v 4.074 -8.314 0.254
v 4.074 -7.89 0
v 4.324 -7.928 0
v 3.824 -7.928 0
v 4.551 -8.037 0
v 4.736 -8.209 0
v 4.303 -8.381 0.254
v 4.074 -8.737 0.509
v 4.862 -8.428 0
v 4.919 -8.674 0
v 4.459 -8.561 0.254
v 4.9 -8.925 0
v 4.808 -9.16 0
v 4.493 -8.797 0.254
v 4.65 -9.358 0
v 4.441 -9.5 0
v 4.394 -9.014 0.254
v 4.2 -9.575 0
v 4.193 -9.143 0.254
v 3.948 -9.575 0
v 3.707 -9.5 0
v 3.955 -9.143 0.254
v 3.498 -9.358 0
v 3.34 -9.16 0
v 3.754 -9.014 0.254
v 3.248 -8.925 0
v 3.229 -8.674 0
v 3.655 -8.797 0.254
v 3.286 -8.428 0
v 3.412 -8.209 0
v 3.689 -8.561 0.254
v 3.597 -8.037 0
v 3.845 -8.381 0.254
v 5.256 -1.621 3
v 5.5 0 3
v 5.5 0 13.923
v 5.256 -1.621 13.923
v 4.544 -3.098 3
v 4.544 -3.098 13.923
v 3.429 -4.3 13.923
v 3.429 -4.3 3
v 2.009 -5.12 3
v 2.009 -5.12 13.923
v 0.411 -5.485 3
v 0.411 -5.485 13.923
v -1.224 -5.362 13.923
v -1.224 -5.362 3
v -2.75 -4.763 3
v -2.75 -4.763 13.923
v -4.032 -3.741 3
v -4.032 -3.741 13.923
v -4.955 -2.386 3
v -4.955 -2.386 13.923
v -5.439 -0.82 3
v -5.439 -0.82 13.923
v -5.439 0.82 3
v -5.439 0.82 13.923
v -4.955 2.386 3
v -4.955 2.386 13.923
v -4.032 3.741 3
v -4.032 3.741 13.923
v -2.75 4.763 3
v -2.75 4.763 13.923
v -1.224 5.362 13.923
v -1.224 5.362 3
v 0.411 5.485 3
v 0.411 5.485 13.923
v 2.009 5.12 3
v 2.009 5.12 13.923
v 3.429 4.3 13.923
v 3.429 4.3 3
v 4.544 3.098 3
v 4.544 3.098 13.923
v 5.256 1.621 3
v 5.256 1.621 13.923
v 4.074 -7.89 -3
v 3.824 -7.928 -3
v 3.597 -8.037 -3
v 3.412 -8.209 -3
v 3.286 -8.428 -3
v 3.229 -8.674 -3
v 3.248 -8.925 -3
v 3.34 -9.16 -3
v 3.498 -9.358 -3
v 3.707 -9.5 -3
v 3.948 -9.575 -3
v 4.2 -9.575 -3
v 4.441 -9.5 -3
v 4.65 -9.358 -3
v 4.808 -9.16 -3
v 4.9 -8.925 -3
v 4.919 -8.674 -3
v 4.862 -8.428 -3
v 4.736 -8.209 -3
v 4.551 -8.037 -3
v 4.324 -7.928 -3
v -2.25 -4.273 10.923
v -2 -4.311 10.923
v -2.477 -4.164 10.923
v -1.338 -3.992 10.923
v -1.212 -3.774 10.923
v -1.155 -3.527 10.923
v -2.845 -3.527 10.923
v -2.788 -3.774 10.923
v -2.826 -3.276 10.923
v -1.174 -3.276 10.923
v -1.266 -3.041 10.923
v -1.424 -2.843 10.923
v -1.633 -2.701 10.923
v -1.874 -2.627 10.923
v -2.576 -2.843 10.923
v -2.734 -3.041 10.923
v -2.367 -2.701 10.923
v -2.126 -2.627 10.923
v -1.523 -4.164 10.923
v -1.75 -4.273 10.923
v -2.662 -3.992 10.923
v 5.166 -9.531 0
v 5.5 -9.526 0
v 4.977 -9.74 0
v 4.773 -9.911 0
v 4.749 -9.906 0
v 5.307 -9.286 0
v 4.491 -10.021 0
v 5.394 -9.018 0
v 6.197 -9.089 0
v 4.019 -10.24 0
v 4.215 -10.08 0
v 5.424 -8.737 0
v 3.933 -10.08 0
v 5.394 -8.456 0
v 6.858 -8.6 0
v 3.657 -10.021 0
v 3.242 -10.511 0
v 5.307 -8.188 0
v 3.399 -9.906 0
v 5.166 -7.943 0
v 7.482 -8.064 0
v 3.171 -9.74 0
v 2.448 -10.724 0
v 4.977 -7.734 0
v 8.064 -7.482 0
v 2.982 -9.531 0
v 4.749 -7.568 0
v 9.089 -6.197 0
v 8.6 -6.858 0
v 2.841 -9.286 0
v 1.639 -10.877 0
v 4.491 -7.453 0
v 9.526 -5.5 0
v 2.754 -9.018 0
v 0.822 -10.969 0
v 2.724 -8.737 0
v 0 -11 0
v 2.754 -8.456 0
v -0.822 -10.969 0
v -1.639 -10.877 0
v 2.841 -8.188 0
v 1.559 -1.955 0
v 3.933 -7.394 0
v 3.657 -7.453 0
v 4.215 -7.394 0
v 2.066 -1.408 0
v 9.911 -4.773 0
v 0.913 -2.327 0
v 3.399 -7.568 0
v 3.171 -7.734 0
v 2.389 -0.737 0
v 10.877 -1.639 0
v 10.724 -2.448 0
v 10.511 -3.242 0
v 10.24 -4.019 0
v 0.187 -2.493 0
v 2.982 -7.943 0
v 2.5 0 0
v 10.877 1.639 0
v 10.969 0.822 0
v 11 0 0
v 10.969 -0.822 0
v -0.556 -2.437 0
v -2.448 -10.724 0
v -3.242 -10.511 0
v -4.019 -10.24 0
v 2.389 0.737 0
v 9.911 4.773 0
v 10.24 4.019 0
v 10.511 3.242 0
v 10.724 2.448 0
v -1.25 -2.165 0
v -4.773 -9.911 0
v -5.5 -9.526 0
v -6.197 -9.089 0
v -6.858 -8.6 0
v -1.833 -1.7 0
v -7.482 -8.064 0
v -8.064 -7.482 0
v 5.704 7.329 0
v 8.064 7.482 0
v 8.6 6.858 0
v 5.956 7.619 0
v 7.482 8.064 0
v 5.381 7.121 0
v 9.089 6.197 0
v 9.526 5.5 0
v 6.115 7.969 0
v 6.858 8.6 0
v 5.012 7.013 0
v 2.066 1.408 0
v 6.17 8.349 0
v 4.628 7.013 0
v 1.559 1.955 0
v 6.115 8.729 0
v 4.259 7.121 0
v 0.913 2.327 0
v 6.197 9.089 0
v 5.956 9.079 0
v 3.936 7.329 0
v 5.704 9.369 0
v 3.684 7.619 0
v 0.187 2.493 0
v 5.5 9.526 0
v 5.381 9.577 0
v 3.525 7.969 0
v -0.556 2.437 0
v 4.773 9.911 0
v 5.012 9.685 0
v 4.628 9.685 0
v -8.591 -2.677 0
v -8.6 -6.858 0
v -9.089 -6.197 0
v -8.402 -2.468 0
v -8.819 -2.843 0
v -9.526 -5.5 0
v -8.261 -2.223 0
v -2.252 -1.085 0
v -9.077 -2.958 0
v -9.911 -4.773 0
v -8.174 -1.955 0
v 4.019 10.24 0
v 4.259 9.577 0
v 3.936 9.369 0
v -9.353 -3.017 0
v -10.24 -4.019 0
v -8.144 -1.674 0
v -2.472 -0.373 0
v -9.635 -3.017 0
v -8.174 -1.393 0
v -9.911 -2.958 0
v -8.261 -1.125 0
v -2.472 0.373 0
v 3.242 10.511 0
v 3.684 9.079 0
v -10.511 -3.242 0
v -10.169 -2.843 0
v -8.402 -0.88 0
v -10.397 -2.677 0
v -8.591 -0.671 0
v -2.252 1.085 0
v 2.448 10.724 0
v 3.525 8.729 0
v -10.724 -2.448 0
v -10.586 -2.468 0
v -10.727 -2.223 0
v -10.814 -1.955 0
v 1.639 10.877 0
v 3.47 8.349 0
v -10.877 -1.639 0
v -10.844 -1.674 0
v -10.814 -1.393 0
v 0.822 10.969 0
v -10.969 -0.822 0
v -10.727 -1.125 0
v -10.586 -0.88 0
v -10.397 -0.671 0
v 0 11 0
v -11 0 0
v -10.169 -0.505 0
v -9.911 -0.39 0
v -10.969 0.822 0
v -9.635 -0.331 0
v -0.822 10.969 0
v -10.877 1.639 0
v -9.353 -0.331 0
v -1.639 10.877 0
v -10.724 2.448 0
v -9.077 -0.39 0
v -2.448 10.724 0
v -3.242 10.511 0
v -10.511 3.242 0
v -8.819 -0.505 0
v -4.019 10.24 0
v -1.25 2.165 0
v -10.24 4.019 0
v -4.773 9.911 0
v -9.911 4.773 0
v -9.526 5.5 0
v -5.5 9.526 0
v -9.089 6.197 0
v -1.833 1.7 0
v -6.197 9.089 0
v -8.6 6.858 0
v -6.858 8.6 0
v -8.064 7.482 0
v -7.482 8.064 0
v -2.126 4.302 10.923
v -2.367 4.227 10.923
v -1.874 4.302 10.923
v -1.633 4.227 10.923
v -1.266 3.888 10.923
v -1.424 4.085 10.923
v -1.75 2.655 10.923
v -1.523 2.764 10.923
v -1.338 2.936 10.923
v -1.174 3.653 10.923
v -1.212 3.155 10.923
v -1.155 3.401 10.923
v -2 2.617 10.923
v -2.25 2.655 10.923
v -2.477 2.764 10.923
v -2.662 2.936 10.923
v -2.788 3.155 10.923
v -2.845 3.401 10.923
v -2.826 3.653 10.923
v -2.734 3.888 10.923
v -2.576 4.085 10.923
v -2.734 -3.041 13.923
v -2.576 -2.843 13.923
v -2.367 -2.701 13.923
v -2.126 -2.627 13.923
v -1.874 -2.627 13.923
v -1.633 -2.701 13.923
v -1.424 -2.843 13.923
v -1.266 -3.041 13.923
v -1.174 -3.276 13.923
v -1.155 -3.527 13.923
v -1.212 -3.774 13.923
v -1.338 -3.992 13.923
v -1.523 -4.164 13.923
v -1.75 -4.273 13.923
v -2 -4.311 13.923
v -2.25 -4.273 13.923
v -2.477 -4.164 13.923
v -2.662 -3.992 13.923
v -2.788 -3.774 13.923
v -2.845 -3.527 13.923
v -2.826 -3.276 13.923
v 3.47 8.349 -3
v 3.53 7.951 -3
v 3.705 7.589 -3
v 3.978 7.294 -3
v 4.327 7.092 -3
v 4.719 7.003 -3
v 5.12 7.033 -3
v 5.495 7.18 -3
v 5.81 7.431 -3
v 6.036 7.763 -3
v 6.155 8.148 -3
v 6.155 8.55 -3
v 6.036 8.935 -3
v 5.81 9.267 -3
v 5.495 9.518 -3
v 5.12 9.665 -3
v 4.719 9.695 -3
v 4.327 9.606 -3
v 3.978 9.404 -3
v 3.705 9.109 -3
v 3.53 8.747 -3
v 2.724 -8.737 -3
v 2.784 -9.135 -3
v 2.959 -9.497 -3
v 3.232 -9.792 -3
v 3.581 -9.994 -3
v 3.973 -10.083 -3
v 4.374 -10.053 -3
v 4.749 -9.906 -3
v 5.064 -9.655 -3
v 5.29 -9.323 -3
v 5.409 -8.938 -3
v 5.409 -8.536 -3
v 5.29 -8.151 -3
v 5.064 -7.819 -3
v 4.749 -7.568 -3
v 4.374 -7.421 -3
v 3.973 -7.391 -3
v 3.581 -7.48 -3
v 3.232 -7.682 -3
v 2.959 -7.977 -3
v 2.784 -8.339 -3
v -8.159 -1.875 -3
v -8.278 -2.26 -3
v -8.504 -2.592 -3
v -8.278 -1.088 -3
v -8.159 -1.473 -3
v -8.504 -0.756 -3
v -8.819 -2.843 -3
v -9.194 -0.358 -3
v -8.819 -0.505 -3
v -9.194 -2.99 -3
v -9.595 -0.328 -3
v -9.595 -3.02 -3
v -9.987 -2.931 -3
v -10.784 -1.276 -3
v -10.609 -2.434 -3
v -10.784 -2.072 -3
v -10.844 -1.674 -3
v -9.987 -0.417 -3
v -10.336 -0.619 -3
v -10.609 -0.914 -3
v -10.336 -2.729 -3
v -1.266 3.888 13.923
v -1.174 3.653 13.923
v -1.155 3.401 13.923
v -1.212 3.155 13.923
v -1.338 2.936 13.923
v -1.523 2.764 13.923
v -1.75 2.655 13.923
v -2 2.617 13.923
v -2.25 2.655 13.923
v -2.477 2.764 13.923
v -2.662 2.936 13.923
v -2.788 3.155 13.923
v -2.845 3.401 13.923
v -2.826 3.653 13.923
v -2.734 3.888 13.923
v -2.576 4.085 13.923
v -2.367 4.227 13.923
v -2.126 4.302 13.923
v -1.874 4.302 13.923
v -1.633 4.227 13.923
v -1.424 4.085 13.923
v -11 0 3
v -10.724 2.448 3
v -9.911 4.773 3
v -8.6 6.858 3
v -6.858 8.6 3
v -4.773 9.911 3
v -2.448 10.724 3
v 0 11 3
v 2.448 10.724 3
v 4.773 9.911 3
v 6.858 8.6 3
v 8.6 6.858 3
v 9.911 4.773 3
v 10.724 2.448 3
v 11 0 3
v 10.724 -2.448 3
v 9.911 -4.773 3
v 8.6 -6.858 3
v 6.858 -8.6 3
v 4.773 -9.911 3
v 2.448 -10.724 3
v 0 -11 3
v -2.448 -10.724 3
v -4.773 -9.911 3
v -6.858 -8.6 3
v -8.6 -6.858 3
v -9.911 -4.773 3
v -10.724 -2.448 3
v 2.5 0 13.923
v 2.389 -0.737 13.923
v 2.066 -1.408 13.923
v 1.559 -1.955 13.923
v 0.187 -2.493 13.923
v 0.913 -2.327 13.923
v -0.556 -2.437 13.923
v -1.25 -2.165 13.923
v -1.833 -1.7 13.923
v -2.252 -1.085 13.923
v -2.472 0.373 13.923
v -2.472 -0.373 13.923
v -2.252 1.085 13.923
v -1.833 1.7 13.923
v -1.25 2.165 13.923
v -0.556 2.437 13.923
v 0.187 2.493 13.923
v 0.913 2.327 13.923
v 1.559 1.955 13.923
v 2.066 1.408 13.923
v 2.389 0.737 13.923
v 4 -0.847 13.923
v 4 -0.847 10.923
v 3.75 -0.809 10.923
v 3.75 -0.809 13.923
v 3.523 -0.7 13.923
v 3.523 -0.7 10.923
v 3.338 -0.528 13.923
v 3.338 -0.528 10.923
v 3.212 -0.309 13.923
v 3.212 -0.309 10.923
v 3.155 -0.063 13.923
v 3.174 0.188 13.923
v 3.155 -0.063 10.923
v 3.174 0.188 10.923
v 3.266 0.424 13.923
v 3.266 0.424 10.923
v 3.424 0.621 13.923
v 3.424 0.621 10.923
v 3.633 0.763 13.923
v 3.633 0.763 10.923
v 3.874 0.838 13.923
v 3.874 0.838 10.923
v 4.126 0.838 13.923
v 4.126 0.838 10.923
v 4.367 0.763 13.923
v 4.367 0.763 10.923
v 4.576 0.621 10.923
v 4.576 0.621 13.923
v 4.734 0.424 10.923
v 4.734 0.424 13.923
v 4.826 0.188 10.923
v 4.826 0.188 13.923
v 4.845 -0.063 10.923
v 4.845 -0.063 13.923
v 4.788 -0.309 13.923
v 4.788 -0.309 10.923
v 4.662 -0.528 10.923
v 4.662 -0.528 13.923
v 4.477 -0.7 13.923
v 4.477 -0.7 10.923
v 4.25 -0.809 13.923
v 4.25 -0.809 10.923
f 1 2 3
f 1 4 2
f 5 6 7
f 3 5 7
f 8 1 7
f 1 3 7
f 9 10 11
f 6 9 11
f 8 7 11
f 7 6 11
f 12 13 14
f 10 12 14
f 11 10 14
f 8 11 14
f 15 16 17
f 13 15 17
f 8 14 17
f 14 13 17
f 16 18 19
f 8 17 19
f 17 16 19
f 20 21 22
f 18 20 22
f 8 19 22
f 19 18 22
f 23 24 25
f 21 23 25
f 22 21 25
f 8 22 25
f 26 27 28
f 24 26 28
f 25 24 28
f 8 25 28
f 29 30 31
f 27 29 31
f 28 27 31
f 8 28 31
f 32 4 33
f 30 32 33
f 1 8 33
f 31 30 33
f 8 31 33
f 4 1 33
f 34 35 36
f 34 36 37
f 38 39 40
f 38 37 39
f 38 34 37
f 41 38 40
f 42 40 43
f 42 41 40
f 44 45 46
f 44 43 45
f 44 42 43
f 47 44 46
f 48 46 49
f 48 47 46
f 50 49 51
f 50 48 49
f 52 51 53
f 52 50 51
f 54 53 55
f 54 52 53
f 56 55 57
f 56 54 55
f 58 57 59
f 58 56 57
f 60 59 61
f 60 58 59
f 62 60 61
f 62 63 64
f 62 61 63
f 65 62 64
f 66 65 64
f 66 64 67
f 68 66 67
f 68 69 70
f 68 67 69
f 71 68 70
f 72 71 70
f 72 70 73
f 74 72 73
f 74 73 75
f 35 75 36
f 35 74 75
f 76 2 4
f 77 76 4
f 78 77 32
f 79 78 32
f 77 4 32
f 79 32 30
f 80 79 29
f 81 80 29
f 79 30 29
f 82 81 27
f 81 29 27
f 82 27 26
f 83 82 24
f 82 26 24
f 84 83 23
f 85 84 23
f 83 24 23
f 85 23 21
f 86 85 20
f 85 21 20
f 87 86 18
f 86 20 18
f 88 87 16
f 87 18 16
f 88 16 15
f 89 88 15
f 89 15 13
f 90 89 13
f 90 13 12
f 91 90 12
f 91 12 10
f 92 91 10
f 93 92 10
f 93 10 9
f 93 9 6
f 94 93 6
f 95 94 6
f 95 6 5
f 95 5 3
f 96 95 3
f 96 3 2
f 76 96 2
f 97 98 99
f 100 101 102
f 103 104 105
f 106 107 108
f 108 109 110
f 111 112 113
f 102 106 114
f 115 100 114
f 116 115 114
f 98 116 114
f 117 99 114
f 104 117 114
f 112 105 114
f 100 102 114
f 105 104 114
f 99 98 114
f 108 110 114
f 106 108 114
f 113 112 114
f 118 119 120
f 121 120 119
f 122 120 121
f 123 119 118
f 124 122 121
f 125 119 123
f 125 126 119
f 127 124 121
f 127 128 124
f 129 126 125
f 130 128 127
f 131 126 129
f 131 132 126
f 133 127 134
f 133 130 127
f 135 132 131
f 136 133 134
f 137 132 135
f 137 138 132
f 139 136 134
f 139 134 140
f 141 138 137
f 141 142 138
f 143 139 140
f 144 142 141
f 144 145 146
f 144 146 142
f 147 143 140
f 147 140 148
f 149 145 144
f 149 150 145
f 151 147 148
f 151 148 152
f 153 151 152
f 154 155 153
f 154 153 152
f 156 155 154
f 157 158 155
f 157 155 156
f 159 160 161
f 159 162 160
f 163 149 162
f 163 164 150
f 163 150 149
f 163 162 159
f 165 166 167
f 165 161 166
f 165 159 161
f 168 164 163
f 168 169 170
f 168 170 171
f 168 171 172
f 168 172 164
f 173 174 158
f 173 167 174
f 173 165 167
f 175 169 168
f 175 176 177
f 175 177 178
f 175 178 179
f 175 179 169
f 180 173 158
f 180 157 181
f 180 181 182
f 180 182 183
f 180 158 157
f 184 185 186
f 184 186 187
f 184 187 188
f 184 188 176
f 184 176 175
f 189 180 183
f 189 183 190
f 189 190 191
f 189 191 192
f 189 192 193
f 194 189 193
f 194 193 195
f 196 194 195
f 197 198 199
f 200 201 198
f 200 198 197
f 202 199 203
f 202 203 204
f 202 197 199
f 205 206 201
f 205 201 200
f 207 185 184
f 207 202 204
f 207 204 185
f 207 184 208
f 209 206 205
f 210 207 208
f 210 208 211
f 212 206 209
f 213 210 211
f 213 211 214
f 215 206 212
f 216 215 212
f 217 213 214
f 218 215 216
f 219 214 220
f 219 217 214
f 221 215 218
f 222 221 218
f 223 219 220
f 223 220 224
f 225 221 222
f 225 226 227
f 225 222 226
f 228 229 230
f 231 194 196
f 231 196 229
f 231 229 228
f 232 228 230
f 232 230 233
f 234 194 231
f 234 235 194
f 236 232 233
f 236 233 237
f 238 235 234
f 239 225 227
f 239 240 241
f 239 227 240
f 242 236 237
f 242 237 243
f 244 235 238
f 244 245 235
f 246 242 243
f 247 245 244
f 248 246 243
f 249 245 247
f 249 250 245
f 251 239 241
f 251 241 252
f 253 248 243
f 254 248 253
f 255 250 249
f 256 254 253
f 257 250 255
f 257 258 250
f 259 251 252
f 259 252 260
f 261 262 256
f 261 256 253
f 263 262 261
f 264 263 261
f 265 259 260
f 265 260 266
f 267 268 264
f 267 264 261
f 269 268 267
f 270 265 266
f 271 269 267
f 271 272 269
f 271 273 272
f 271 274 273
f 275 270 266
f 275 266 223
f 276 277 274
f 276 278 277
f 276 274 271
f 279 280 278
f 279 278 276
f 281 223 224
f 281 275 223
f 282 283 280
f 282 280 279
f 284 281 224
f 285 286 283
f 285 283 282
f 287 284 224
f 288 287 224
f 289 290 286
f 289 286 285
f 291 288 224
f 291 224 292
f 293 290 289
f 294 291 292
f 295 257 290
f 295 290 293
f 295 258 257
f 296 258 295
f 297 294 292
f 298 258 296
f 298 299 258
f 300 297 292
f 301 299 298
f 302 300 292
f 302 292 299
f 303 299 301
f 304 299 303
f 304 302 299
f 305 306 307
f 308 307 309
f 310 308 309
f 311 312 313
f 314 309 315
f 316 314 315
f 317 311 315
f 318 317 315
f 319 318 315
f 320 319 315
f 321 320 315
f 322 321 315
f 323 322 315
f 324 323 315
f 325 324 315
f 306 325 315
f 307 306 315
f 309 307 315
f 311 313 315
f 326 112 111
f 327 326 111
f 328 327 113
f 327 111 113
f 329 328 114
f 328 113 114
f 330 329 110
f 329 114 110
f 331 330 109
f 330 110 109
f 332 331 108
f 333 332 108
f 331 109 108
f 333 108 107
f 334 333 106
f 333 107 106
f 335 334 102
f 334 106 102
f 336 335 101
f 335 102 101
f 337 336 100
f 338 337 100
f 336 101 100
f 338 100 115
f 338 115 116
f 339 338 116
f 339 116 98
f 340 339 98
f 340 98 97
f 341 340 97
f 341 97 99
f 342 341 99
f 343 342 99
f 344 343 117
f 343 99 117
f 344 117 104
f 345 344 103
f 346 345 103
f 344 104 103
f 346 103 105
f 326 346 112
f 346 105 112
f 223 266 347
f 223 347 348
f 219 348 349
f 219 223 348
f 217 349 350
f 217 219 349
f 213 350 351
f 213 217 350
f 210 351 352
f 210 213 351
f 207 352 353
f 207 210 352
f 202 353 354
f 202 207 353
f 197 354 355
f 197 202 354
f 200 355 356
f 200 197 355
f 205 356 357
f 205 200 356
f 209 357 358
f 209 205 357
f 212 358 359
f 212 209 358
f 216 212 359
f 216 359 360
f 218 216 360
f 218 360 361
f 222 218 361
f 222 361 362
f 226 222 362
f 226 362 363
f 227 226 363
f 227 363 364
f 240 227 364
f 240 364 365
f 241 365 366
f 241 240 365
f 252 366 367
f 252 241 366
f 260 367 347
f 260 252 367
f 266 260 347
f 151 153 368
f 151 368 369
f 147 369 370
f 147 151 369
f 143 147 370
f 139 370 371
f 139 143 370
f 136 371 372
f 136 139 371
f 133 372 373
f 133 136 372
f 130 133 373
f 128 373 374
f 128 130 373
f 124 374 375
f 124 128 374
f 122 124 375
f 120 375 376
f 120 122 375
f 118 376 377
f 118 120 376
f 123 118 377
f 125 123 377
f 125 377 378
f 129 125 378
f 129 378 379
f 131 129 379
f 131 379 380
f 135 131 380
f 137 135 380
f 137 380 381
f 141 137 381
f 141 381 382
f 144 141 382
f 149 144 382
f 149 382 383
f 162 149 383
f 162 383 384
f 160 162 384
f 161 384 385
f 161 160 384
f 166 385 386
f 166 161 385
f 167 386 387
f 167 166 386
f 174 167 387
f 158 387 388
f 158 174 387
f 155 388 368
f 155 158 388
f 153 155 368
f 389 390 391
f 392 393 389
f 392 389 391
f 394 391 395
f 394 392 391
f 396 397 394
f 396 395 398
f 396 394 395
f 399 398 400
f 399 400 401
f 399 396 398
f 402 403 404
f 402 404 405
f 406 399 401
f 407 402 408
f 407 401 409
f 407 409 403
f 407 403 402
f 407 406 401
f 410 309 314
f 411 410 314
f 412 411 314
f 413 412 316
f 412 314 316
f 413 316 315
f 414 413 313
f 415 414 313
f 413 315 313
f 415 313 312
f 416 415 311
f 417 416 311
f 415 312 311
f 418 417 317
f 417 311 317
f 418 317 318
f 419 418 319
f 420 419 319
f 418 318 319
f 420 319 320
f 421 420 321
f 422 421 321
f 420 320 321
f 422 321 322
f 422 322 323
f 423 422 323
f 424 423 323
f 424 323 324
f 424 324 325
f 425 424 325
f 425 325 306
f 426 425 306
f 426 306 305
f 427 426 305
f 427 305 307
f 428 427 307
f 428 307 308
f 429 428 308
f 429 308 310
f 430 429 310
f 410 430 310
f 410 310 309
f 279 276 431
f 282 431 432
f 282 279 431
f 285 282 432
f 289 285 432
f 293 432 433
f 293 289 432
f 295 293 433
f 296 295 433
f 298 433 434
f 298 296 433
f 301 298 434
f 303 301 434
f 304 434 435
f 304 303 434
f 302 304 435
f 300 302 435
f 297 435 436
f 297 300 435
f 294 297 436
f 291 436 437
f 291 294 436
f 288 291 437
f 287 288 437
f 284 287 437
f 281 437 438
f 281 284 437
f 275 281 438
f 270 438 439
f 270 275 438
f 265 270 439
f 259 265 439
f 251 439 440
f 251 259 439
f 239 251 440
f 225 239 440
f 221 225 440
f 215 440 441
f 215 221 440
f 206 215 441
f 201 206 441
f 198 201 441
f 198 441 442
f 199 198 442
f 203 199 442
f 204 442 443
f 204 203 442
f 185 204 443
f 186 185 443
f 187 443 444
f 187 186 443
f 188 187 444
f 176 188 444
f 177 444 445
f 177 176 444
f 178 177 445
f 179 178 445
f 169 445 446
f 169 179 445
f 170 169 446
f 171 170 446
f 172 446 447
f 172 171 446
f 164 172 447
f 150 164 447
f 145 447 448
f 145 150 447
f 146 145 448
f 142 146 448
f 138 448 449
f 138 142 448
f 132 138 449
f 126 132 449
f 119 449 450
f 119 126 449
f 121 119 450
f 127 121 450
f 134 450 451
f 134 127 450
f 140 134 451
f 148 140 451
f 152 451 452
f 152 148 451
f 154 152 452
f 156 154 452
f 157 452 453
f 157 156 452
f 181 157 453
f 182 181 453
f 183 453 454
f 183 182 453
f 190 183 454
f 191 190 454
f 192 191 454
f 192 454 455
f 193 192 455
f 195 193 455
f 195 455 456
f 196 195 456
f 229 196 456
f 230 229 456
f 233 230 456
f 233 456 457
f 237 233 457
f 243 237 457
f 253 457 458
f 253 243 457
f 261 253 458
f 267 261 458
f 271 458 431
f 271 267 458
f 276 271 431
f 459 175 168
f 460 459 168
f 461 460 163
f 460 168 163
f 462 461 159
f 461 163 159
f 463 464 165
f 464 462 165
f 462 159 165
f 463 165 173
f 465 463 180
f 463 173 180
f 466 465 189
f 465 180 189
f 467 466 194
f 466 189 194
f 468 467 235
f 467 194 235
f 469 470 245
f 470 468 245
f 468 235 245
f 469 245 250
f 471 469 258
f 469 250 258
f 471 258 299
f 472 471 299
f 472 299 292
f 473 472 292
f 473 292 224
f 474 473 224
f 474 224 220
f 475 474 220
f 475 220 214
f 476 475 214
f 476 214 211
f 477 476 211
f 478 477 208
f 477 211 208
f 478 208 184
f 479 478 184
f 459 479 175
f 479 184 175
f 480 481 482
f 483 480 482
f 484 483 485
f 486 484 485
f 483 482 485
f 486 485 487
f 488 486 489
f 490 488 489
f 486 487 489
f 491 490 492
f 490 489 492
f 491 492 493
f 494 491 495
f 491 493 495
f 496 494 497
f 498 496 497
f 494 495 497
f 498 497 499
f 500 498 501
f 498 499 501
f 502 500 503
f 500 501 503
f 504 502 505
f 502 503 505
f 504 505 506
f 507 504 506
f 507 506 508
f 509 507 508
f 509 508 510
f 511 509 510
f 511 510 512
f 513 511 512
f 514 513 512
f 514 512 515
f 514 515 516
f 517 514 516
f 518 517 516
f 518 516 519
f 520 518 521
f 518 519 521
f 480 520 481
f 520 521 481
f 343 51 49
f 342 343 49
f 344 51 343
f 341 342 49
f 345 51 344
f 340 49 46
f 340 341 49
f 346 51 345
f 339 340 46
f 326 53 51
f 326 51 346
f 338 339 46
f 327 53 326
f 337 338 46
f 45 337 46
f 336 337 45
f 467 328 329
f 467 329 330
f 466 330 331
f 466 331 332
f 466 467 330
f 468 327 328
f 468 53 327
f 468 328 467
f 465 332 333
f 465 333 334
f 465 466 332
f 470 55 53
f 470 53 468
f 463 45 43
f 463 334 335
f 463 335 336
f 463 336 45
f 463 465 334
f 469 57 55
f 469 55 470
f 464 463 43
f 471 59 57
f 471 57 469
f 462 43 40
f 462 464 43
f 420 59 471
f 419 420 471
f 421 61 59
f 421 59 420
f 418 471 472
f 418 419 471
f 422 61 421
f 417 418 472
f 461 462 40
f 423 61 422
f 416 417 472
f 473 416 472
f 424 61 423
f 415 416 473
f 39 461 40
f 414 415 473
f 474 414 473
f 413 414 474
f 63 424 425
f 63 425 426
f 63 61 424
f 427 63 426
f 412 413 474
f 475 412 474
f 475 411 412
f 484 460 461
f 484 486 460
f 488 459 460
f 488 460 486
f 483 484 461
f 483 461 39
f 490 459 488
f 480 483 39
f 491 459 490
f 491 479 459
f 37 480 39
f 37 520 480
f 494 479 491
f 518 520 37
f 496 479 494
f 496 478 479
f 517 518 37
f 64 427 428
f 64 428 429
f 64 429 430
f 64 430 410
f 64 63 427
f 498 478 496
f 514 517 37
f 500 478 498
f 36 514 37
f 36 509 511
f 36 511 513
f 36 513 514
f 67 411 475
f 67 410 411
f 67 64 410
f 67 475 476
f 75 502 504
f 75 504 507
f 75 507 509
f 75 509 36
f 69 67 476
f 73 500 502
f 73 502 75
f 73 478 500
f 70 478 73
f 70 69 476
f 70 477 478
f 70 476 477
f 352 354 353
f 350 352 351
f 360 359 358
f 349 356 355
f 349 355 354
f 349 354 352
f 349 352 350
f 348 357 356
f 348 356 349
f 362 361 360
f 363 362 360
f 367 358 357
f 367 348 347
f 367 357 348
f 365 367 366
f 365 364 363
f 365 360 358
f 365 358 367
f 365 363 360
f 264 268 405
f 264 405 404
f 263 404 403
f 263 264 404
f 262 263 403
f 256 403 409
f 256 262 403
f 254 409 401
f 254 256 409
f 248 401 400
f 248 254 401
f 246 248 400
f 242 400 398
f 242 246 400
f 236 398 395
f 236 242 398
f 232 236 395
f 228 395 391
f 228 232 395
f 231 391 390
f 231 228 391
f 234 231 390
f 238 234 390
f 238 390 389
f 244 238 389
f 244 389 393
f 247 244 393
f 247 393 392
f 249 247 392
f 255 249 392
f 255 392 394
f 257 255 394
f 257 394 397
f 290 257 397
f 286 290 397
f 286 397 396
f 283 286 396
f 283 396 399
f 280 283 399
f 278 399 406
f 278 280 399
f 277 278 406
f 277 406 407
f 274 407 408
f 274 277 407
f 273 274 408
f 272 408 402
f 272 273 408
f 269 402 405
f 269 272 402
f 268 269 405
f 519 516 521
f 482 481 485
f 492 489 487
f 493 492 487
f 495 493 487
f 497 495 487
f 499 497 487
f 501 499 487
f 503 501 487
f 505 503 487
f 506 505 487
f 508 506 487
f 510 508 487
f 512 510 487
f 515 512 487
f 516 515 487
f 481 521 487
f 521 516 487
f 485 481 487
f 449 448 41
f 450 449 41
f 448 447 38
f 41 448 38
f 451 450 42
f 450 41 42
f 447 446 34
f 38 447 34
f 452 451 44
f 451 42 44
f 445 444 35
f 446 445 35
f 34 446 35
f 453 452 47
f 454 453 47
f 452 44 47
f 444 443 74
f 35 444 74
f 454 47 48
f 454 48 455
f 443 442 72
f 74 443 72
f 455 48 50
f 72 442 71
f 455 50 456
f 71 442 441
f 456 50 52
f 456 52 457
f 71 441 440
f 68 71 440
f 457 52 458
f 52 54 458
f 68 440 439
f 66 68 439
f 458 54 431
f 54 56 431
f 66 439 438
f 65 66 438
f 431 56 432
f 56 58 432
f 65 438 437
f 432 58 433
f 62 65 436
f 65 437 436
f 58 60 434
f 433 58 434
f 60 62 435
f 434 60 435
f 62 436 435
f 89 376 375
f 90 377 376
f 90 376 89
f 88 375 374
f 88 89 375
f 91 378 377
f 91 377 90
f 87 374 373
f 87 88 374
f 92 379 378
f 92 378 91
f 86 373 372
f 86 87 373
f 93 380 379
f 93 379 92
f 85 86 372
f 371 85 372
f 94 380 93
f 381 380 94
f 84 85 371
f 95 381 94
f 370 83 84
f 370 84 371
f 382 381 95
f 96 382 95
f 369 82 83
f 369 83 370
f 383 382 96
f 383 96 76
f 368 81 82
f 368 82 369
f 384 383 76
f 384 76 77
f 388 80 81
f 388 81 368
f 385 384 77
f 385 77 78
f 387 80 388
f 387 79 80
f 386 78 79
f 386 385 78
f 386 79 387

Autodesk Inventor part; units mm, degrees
ref_plane "YZ Plane" through (0, 0, 0) normal (1, 0, 0) x (0, 1, 0)
ref_plane "XZ Plane" through (0, 0, 0) normal (0, 1, 0) x (-1, 0, 0)
ref_plane "XY Plane" through (0, 0, 0) normal (0, 0, 1) x (1, 0, 0)
sketch "Sketch1" plane through (0, 0, 0) normal (0, 0, 1) x (1, 0, 0)
  circle A0 centre (0, 0) radius 5.5
  circle A1 centre (0, 0) radius 2.5
  dimension "d0" = 11
  dimension "d1" = 5
extrude "Extrusion1" add sketch "Sketch1" along normal blind 13.923
sketch "Sketch2" plane through (0, 0, 0) normal (0, 0, -1) x (-1, 0, 0)
  circle A0 centre (0, 0) radius 5.5 projected
  circle A1 centre (0, 0) radius 11
  dimension "d4" = 22
extrude "Extrusion2" add sketch "Sketch2" against normal blind 3
sketch "Sketch3" plane through (0, 0, 0) normal (0, 0, -1) x (-1, 0, 0)
  line L0 (-6.245, 5) -> (-3, 5)
  circle A0 centre (0, 0) radius 1.5
  line L1 (-3, 5) -> (-3, -5)
  line L2 (-3, -5) -> (-6.245, -5)
  circle A1 centre (9.494, -1.674) radius 0.85
  spline S0 degree 3 poles (10.2296, -1.2481) (10.2738, -1.3244) (10.307, -1.4092) (10.3385, -1.5597) (10.3447, -1.6214) (10.3436, -1.712) (10.3419, -1.74) (10.3365, -1.7883) (10.3335, -1.8088) (10.3258, -1.8503) (10.3211, -1.8713) (10.3072, -1.9234) (10.2972, -1.9541) (10.2556, -2.0601) (10.2157, -2.1299) (10.1087, -2.269) (10.0384, -2.3333) (9.8581, -2.452) (9.7422, -2.496) (9.5082, -2.5317) (9.39, -2.526) (9.1776, -2.4693) (9.0836, -2.4258) (8.9226, -2.3102) (8.8553, -2.243) (8.7497, -2.0936) (8.7103, -2.0147) (8.6611, -1.8594) (8.648, -1.7853) (8.6432, -1.6739) (8.644, -1.6375) (8.6494, -1.5744) (8.653, -1.5477) (8.6628, -1.4942) (8.669, -1.4673) (8.6873, -1.4034) (8.7006, -1.3666) (8.7492, -1.2563) (8.7927, -1.1869) (8.912, -1.0459) (8.9921, -0.9805) (9.1784, -0.8769) (9.2836, -0.8435) (9.5106, -0.8156) (9.6296, -0.8269) (9.8522, -0.8944) (9.955, -0.9506) (10.1164, -1.0872) (10.1799, -1.1623) (10.2296, -1.2481) knots -0.565469 -0.565469 -0.565469 -0.565469 -0.536596 -0.536596 -0.517611 -0.517611 -0.509175 -0.509175 -0.50297 -0.50297 -0.496493 -0.496493 -0.486731 -0.486731 -0.461904 -0.461904 -0.431221 -0.431221 -0.390112 -0.390112 -0.351113 -0.351113 -0.31806 -0.31806 -0.288721 -0.288721 -0.262067 -0.262067 -0.23952 -0.23952 -0.228596 -0.228596 -0.220512 -0.220512 -0.212256 -0.212256 -0.200543 -0.200543 -0.176006 -0.176006 -0.144684 -0.144684 -0.110272 -0.110272 -0.071492 -0.071492 -0.032498 -0.032498 0 0 0 0
  circle A2 centre (9.494, -1.674) radius 1.35
  arc A3 (0, -8) -> (-6.245, 5) centre (0, 0) ccw
  arc A4 (-6.245, -5) -> (0, -8) centre (0, 0) ccw
  circle A5 centre (-4.074, -8.737) radius 0.85
  spline S1 degree 3 poles (-3.2275, -8.6604) (-3.2176, -8.7695) (-3.229, -8.877) (-3.2876, -9.0751) (-3.3329, -9.1647) (-3.4588, -9.3344) (-3.5435, -9.4107) (-3.7198, -9.5152) (-3.8078, -9.5499) (-3.9747, -9.5845) (-4.0515, -9.5903) (-4.1887, -9.5813) (-4.248, -9.5712) (-4.333, -9.547) (-4.3592, -9.5382) (-4.4041, -9.5206) (-4.4229, -9.5123) (-4.4611, -9.4941) (-4.4802, -9.484) (-4.5275, -9.4567) (-4.5549, -9.4386) (-4.6492, -9.3685) (-4.7078, -9.3092) (-4.8155, -9.1642) (-4.8589, -9.0767) (-4.9231, -8.8674) (-4.9328, -8.7429) (-4.9006, -8.5082) (-4.8622, -8.3976) (-4.7491, -8.2109) (-4.6814, -8.1333) (-4.5263, -8.0114) (-4.4435, -7.9656) (-4.2507, -7.8985) (-4.1412, -7.8825) (-3.9721, -7.8911) (-3.9136, -7.9002) (-3.8251, -7.9236) (-3.7941, -7.9337) (-3.7394, -7.9552) (-3.7153, -7.9659) (-3.6658, -7.9908) (-3.6405, -8.0053) (-3.5776, -8.0455) (-3.5413, -8.0731) (-3.4268, -8.1755) (-3.361, -8.262) (-3.2655, -8.4537) (-3.2369, -8.5564) (-3.2275, -8.6604) knots -0.566086 -0.566086 -0.566086 -0.566086 -0.531825 -0.531825 -0.498779 -0.498779 -0.460694 -0.460694 -0.429612 -0.429612 -0.405256 -0.405256 -0.386838 -0.386838 -0.378505 -0.378505 -0.372312 -0.372312 -0.365791 -0.365791 -0.355852 -0.355852 -0.330056 -0.330056 -0.298514 -0.298514 -0.25701 -0.25701 -0.218398 -0.218398 -0.185587 -0.185587 -0.156394 -0.156394 -0.123104 -0.123104 -0.105349 -0.105349 -0.095573 -0.095573 -0.087672 -0.087672 -0.078924 -0.078924 -0.065227 -0.065227 -0.032657 -0.032657 0 0 0 0
  circle A6 centre (-4.074, -8.737) radius 1.35
  circle A7 centre (-4.82, 8.349) radius 0.85
  spline S2 degree 3 poles (-4.1123, 8.8197) (-4.052, 8.7291) (-4.0084, 8.6259) (-3.9677, 8.4209) (-3.9647, 8.3234) (-3.9919, 8.1375) (-4.0188, 8.0509) (-4.0994, 7.8893) (-4.1522, 7.8154) (-4.2455, 7.7212) (-4.2773, 7.6934) (-4.3337, 7.6513) (-4.3572, 7.6355) (-4.4041, 7.6072) (-4.4275, 7.5946) (-4.4822, 7.5683) (-4.5139, 7.5553) (-4.6086, 7.5231) (-4.6731, 7.5092) (-4.8426, 7.4929) (-4.947, 7.5022) (-5.1521, 7.5589) (-5.2492, 7.6077) (-5.4281, 7.7434) (-5.5042, 7.8321) (-5.6193, 8.0357) (-5.6549, 8.1509) (-5.6758, 8.3693) (-5.6674, 8.4725) (-5.6185, 8.6517) (-5.5851, 8.7291) (-5.4963, 8.8702) (-5.4427, 8.9337) (-5.3552, 9.0101) (-5.3302, 9.0296) (-5.2865, 9.0599) (-5.2685, 9.0714) (-5.2323, 9.0926) (-5.2143, 9.1023) (-5.1705, 9.1239) (-5.1446, 9.1351) (-5.0727, 9.162) (-5.0263, 9.175) (-4.8823, 9.2025) (-4.7852, 9.2034) (-4.5796, 9.1723) (-4.4735, 9.1329) (-4.2735, 9.0117) (-4.182, 8.9246) (-4.1123, 8.8197) knots -0.567177 -0.567177 -0.567177 -0.567177 -0.53086 -0.53086 -0.500336 -0.500336 -0.472721 -0.472721 -0.445441 -0.445441 -0.432747 -0.432747 -0.42424 -0.42424 -0.416254 -0.416254 -0.405955 -0.405955 -0.386117 -0.386117 -0.354442 -0.354442 -0.320748 -0.320748 -0.283148 -0.283148 -0.243084 -0.243084 -0.208567 -0.208567 -0.181377 -0.181377 -0.155642 -0.155642 -0.146036 -0.146036 -0.139581 -0.139581 -0.133402 -0.133402 -0.124853 -0.124853 -0.110096 -0.110096 -0.079394 -0.079394 -0.04201 -0.04201 0 0 0 0
  circle A8 centre (-4.82, 8.349) radius 1.35
  circle A9 centre (0, 0) radius 1.5
  circle A10 centre (0, 0) radius 8
  dimension "d7" = 2.7
  dimension "d8" = 2.7
  dimension "d9" = 2.7
extrude "Extrusion3" add sketch "Sketch3" along normal blind 3 contours A1 | A2 | A5 | A6 | A7 | A8
sketch "Sketch4" plane through (0, 0, 13.923) normal (0, 0, 1) x (1, 0, 0)
  circle A0 centre (0, 0) radius 2.5 projected
  line L0 (-7.7, 0) -> (7.7, 0) projected
  point P0 (4, 0)
  dimension "d12" = 4
hole "Hole1" at (4, 0, 13.923) direction (0, 0, -1) diameter 1.694 depth 3 thread size "2-56 UNC" class "2B" standard "ANSI Unified Screw Threads"
pattern_circular "Circular Pattern1" count 3 over 360 about axis through (0, 0, -10) along (0, 0, 1) of "Hole1"
sketch "Sketch5" plane through (4.074, -8.737, -3) normal (0, 0, -1) x (-1, 0, 0)
  circle A0 centre (0, 0) radius 1.35 projected
  point P0 (4.074, 8.737)
hole "Hole2" at (4.074, -8.737, -3) direction (0, 0, 1) diameter 1.694 depth 3 tip angle 118 thread size "2-56 UNC" class "2B" standard "ANSI Unified Screw Threads"
properties part number "ss_inner_guide_bottom"
